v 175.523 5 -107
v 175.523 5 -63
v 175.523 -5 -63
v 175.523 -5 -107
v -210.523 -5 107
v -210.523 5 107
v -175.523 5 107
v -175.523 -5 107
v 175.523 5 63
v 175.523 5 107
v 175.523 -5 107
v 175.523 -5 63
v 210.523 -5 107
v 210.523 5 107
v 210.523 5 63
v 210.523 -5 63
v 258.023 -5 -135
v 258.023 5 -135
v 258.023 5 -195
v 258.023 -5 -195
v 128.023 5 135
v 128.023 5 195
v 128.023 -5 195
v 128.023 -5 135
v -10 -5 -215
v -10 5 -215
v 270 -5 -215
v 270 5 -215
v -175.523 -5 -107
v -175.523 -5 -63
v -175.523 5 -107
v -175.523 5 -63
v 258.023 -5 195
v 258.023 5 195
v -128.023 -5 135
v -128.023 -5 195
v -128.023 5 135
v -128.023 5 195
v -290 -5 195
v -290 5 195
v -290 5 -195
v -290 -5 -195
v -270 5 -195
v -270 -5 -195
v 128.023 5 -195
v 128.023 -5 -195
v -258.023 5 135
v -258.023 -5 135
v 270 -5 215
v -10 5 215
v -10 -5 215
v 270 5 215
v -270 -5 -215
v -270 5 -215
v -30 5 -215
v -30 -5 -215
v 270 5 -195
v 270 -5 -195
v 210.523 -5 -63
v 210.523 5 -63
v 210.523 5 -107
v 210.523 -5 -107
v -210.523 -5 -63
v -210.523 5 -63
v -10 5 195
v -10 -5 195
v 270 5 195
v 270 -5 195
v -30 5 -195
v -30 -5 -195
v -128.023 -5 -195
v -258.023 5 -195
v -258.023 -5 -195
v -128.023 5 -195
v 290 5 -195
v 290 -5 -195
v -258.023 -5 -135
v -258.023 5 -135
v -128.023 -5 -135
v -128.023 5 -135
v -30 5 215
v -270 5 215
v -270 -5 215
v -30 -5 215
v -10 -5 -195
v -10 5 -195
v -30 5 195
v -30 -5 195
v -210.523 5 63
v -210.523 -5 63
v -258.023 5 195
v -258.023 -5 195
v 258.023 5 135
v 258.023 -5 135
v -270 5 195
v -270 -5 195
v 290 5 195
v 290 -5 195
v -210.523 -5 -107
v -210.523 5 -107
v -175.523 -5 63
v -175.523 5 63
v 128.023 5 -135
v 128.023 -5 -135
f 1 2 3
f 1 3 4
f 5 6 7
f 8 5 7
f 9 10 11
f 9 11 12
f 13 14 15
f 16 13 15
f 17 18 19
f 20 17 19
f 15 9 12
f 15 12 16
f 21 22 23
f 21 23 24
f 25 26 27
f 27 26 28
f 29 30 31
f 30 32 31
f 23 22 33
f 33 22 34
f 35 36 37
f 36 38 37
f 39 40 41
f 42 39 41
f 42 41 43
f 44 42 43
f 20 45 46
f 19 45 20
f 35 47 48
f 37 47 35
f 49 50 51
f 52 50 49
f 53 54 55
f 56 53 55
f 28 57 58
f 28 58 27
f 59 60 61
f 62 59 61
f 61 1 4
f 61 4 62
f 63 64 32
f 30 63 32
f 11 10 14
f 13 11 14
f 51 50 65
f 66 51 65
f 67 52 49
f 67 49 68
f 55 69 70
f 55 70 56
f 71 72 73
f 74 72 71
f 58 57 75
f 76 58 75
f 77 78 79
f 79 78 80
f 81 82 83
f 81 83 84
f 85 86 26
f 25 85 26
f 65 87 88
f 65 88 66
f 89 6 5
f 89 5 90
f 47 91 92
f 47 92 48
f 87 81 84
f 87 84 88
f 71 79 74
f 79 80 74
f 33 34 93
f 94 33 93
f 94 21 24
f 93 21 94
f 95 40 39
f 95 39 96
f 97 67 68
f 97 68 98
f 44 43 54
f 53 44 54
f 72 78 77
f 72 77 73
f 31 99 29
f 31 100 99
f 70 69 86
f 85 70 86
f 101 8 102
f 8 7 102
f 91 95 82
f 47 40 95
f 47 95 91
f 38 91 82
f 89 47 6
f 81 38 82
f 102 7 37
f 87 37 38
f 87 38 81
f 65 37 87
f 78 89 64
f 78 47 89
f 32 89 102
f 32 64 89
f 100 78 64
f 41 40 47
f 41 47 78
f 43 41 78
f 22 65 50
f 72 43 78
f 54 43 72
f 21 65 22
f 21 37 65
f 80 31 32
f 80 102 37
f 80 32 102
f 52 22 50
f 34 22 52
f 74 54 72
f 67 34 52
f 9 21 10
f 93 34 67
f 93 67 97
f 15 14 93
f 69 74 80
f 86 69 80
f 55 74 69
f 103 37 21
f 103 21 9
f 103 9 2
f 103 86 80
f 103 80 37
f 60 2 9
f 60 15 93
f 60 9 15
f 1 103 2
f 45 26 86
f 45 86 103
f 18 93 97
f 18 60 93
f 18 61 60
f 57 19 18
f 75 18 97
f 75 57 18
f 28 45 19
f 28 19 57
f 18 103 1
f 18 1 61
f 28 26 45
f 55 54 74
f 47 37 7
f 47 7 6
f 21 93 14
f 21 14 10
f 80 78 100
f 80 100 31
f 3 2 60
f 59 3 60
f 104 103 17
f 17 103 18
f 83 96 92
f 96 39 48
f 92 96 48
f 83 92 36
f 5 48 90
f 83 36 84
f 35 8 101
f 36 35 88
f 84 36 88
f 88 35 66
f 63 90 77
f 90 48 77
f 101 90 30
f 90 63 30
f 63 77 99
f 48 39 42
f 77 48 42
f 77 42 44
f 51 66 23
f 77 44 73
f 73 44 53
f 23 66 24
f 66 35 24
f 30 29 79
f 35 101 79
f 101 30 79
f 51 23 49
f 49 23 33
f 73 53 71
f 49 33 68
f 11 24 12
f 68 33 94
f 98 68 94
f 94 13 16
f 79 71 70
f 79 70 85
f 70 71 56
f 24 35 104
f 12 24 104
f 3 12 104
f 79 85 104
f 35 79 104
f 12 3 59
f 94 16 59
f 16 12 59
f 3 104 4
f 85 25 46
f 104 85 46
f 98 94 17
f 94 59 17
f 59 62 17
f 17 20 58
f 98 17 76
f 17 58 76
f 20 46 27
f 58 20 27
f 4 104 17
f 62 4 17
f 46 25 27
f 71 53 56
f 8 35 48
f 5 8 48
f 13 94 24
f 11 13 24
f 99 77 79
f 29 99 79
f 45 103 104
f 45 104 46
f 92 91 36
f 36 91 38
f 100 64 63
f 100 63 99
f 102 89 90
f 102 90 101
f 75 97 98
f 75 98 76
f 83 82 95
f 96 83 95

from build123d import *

# Parameters (mm, degrees)
SKETCH1_W           = 580
SKETCH1_H           = 430
SKETCH1_W_2         = 130
SKETCH1_H_2         = 60
SKETCH1_W_3         = 35
SKETCH1_H_3         = 44
BOSS_EXTRUDE1_DEPTH = 5
SKETCH2_W           = 20
SKETCH2_H           = 20
CUT_EXTRUDE1_DEPTH  = 10
SKETCH3_W           = 130
SKETCH3_H           = 60
SKETCH3_W_2         = 35
SKETCH3_H_2         = 44
CUT_EXTRUDE2_DEPTH  = 98
SKETCH4_W           = 20
SKETCH4_H           = 20
CUT_EXTRUDE3_DEPTH  = 98


with BuildPart() as part:
    # Sketch1 → Boss-Extrude1 (new, symmetric)
    with BuildSketch(Plane(origin=(0, 0, 0), x_dir=(1, 0, 0), z_dir=(0, 1, 0))):
        Rectangle(SKETCH1_W, SKETCH1_H)
        with Locations((-193.023255814, 165)):
            Rectangle(SKETCH1_W_2, SKETCH1_H_2, mode=Mode.SUBTRACT)
        with Locations((-193.023255814, -165)):
            Rectangle(SKETCH1_W_2, SKETCH1_H_2, mode=Mode.SUBTRACT)
        with Locations((-193.023255814, -85)):
            Rectangle(SKETCH1_W_3, SKETCH1_H_3, mode=Mode.SUBTRACT)
        with Locations((-193.023255814, 85)):
            Rectangle(SKETCH1_W_3, SKETCH1_H_3, mode=Mode.SUBTRACT)
    extrude(amount=BOSS_EXTRUDE1_DEPTH, both=True)

    # Sketch2 → Cut-Extrude1 (cut)
    with BuildSketch(Plane(origin=(0, 5, 0), x_dir=(1, 0, 0), z_dir=(0, 1, 0))):
        with Locations((-280, 205)):
            Rectangle(SKETCH2_W, SKETCH2_H)
        with Locations((280, 205)):
            Rectangle(SKETCH2_W, SKETCH2_H)
        with Locations((280, -205)):
            Rectangle(SKETCH2_W, SKETCH2_H)
        with Locations((-280, -205)):
            Rectangle(SKETCH2_W, SKETCH2_H)
    extrude(amount=-CUT_EXTRUDE1_DEPTH, mode=Mode.SUBTRACT)

    # Sketch3 → Cut-Extrude2 (cut)
    with BuildSketch(Plane(origin=(0, 5, 0), x_dir=(1, 0, 0), z_dir=(0, 1, 0))):
        with Locations((193.023255814, -165)):
            Rectangle(SKETCH3_W, SKETCH3_H)
        with Locations((-193.023255814, 165)):
            Rectangle(SKETCH3_W, SKETCH3_H)
        with Locations((193.023255814, -85)):
            Rectangle(SKETCH3_W_2, SKETCH3_H_2)
        with Locations((-193.023255814, 85)):
            Rectangle(SKETCH3_W_2, SKETCH3_H_2)
        with Locations((-193.023255814, -85)):
            Rectangle(SKETCH3_W_2, SKETCH3_H_2)
        with Locations((-193.023255814, -165)):
            Rectangle(SKETCH3_W, SKETCH3_H)
        with Locations((193.023255814, 85)):
            Rectangle(SKETCH3_W_2, SKETCH3_H_2)
        with Locations((193.023255814, 165)):
            Rectangle(SKETCH3_W, SKETCH3_H)
    extrude(amount=-CUT_EXTRUDE2_DEPTH, mode=Mode.SUBTRACT)

    # Sketch4 → Cut-Extrude3 (cut)
    with BuildSketch(Plane(origin=(0, 5, 0), x_dir=(1, 0, 0), z_dir=(0, 1, 0))):
        with Locations((-20, -205)):
            Rectangle(SKETCH4_W, SKETCH4_H)
        with Locations((-20, 205)):
            Rectangle(SKETCH4_W, SKETCH4_H)
    extrude(amount=-CUT_EXTRUDE3_DEPTH, mode=Mode.SUBTRACT)


solid = part.part
